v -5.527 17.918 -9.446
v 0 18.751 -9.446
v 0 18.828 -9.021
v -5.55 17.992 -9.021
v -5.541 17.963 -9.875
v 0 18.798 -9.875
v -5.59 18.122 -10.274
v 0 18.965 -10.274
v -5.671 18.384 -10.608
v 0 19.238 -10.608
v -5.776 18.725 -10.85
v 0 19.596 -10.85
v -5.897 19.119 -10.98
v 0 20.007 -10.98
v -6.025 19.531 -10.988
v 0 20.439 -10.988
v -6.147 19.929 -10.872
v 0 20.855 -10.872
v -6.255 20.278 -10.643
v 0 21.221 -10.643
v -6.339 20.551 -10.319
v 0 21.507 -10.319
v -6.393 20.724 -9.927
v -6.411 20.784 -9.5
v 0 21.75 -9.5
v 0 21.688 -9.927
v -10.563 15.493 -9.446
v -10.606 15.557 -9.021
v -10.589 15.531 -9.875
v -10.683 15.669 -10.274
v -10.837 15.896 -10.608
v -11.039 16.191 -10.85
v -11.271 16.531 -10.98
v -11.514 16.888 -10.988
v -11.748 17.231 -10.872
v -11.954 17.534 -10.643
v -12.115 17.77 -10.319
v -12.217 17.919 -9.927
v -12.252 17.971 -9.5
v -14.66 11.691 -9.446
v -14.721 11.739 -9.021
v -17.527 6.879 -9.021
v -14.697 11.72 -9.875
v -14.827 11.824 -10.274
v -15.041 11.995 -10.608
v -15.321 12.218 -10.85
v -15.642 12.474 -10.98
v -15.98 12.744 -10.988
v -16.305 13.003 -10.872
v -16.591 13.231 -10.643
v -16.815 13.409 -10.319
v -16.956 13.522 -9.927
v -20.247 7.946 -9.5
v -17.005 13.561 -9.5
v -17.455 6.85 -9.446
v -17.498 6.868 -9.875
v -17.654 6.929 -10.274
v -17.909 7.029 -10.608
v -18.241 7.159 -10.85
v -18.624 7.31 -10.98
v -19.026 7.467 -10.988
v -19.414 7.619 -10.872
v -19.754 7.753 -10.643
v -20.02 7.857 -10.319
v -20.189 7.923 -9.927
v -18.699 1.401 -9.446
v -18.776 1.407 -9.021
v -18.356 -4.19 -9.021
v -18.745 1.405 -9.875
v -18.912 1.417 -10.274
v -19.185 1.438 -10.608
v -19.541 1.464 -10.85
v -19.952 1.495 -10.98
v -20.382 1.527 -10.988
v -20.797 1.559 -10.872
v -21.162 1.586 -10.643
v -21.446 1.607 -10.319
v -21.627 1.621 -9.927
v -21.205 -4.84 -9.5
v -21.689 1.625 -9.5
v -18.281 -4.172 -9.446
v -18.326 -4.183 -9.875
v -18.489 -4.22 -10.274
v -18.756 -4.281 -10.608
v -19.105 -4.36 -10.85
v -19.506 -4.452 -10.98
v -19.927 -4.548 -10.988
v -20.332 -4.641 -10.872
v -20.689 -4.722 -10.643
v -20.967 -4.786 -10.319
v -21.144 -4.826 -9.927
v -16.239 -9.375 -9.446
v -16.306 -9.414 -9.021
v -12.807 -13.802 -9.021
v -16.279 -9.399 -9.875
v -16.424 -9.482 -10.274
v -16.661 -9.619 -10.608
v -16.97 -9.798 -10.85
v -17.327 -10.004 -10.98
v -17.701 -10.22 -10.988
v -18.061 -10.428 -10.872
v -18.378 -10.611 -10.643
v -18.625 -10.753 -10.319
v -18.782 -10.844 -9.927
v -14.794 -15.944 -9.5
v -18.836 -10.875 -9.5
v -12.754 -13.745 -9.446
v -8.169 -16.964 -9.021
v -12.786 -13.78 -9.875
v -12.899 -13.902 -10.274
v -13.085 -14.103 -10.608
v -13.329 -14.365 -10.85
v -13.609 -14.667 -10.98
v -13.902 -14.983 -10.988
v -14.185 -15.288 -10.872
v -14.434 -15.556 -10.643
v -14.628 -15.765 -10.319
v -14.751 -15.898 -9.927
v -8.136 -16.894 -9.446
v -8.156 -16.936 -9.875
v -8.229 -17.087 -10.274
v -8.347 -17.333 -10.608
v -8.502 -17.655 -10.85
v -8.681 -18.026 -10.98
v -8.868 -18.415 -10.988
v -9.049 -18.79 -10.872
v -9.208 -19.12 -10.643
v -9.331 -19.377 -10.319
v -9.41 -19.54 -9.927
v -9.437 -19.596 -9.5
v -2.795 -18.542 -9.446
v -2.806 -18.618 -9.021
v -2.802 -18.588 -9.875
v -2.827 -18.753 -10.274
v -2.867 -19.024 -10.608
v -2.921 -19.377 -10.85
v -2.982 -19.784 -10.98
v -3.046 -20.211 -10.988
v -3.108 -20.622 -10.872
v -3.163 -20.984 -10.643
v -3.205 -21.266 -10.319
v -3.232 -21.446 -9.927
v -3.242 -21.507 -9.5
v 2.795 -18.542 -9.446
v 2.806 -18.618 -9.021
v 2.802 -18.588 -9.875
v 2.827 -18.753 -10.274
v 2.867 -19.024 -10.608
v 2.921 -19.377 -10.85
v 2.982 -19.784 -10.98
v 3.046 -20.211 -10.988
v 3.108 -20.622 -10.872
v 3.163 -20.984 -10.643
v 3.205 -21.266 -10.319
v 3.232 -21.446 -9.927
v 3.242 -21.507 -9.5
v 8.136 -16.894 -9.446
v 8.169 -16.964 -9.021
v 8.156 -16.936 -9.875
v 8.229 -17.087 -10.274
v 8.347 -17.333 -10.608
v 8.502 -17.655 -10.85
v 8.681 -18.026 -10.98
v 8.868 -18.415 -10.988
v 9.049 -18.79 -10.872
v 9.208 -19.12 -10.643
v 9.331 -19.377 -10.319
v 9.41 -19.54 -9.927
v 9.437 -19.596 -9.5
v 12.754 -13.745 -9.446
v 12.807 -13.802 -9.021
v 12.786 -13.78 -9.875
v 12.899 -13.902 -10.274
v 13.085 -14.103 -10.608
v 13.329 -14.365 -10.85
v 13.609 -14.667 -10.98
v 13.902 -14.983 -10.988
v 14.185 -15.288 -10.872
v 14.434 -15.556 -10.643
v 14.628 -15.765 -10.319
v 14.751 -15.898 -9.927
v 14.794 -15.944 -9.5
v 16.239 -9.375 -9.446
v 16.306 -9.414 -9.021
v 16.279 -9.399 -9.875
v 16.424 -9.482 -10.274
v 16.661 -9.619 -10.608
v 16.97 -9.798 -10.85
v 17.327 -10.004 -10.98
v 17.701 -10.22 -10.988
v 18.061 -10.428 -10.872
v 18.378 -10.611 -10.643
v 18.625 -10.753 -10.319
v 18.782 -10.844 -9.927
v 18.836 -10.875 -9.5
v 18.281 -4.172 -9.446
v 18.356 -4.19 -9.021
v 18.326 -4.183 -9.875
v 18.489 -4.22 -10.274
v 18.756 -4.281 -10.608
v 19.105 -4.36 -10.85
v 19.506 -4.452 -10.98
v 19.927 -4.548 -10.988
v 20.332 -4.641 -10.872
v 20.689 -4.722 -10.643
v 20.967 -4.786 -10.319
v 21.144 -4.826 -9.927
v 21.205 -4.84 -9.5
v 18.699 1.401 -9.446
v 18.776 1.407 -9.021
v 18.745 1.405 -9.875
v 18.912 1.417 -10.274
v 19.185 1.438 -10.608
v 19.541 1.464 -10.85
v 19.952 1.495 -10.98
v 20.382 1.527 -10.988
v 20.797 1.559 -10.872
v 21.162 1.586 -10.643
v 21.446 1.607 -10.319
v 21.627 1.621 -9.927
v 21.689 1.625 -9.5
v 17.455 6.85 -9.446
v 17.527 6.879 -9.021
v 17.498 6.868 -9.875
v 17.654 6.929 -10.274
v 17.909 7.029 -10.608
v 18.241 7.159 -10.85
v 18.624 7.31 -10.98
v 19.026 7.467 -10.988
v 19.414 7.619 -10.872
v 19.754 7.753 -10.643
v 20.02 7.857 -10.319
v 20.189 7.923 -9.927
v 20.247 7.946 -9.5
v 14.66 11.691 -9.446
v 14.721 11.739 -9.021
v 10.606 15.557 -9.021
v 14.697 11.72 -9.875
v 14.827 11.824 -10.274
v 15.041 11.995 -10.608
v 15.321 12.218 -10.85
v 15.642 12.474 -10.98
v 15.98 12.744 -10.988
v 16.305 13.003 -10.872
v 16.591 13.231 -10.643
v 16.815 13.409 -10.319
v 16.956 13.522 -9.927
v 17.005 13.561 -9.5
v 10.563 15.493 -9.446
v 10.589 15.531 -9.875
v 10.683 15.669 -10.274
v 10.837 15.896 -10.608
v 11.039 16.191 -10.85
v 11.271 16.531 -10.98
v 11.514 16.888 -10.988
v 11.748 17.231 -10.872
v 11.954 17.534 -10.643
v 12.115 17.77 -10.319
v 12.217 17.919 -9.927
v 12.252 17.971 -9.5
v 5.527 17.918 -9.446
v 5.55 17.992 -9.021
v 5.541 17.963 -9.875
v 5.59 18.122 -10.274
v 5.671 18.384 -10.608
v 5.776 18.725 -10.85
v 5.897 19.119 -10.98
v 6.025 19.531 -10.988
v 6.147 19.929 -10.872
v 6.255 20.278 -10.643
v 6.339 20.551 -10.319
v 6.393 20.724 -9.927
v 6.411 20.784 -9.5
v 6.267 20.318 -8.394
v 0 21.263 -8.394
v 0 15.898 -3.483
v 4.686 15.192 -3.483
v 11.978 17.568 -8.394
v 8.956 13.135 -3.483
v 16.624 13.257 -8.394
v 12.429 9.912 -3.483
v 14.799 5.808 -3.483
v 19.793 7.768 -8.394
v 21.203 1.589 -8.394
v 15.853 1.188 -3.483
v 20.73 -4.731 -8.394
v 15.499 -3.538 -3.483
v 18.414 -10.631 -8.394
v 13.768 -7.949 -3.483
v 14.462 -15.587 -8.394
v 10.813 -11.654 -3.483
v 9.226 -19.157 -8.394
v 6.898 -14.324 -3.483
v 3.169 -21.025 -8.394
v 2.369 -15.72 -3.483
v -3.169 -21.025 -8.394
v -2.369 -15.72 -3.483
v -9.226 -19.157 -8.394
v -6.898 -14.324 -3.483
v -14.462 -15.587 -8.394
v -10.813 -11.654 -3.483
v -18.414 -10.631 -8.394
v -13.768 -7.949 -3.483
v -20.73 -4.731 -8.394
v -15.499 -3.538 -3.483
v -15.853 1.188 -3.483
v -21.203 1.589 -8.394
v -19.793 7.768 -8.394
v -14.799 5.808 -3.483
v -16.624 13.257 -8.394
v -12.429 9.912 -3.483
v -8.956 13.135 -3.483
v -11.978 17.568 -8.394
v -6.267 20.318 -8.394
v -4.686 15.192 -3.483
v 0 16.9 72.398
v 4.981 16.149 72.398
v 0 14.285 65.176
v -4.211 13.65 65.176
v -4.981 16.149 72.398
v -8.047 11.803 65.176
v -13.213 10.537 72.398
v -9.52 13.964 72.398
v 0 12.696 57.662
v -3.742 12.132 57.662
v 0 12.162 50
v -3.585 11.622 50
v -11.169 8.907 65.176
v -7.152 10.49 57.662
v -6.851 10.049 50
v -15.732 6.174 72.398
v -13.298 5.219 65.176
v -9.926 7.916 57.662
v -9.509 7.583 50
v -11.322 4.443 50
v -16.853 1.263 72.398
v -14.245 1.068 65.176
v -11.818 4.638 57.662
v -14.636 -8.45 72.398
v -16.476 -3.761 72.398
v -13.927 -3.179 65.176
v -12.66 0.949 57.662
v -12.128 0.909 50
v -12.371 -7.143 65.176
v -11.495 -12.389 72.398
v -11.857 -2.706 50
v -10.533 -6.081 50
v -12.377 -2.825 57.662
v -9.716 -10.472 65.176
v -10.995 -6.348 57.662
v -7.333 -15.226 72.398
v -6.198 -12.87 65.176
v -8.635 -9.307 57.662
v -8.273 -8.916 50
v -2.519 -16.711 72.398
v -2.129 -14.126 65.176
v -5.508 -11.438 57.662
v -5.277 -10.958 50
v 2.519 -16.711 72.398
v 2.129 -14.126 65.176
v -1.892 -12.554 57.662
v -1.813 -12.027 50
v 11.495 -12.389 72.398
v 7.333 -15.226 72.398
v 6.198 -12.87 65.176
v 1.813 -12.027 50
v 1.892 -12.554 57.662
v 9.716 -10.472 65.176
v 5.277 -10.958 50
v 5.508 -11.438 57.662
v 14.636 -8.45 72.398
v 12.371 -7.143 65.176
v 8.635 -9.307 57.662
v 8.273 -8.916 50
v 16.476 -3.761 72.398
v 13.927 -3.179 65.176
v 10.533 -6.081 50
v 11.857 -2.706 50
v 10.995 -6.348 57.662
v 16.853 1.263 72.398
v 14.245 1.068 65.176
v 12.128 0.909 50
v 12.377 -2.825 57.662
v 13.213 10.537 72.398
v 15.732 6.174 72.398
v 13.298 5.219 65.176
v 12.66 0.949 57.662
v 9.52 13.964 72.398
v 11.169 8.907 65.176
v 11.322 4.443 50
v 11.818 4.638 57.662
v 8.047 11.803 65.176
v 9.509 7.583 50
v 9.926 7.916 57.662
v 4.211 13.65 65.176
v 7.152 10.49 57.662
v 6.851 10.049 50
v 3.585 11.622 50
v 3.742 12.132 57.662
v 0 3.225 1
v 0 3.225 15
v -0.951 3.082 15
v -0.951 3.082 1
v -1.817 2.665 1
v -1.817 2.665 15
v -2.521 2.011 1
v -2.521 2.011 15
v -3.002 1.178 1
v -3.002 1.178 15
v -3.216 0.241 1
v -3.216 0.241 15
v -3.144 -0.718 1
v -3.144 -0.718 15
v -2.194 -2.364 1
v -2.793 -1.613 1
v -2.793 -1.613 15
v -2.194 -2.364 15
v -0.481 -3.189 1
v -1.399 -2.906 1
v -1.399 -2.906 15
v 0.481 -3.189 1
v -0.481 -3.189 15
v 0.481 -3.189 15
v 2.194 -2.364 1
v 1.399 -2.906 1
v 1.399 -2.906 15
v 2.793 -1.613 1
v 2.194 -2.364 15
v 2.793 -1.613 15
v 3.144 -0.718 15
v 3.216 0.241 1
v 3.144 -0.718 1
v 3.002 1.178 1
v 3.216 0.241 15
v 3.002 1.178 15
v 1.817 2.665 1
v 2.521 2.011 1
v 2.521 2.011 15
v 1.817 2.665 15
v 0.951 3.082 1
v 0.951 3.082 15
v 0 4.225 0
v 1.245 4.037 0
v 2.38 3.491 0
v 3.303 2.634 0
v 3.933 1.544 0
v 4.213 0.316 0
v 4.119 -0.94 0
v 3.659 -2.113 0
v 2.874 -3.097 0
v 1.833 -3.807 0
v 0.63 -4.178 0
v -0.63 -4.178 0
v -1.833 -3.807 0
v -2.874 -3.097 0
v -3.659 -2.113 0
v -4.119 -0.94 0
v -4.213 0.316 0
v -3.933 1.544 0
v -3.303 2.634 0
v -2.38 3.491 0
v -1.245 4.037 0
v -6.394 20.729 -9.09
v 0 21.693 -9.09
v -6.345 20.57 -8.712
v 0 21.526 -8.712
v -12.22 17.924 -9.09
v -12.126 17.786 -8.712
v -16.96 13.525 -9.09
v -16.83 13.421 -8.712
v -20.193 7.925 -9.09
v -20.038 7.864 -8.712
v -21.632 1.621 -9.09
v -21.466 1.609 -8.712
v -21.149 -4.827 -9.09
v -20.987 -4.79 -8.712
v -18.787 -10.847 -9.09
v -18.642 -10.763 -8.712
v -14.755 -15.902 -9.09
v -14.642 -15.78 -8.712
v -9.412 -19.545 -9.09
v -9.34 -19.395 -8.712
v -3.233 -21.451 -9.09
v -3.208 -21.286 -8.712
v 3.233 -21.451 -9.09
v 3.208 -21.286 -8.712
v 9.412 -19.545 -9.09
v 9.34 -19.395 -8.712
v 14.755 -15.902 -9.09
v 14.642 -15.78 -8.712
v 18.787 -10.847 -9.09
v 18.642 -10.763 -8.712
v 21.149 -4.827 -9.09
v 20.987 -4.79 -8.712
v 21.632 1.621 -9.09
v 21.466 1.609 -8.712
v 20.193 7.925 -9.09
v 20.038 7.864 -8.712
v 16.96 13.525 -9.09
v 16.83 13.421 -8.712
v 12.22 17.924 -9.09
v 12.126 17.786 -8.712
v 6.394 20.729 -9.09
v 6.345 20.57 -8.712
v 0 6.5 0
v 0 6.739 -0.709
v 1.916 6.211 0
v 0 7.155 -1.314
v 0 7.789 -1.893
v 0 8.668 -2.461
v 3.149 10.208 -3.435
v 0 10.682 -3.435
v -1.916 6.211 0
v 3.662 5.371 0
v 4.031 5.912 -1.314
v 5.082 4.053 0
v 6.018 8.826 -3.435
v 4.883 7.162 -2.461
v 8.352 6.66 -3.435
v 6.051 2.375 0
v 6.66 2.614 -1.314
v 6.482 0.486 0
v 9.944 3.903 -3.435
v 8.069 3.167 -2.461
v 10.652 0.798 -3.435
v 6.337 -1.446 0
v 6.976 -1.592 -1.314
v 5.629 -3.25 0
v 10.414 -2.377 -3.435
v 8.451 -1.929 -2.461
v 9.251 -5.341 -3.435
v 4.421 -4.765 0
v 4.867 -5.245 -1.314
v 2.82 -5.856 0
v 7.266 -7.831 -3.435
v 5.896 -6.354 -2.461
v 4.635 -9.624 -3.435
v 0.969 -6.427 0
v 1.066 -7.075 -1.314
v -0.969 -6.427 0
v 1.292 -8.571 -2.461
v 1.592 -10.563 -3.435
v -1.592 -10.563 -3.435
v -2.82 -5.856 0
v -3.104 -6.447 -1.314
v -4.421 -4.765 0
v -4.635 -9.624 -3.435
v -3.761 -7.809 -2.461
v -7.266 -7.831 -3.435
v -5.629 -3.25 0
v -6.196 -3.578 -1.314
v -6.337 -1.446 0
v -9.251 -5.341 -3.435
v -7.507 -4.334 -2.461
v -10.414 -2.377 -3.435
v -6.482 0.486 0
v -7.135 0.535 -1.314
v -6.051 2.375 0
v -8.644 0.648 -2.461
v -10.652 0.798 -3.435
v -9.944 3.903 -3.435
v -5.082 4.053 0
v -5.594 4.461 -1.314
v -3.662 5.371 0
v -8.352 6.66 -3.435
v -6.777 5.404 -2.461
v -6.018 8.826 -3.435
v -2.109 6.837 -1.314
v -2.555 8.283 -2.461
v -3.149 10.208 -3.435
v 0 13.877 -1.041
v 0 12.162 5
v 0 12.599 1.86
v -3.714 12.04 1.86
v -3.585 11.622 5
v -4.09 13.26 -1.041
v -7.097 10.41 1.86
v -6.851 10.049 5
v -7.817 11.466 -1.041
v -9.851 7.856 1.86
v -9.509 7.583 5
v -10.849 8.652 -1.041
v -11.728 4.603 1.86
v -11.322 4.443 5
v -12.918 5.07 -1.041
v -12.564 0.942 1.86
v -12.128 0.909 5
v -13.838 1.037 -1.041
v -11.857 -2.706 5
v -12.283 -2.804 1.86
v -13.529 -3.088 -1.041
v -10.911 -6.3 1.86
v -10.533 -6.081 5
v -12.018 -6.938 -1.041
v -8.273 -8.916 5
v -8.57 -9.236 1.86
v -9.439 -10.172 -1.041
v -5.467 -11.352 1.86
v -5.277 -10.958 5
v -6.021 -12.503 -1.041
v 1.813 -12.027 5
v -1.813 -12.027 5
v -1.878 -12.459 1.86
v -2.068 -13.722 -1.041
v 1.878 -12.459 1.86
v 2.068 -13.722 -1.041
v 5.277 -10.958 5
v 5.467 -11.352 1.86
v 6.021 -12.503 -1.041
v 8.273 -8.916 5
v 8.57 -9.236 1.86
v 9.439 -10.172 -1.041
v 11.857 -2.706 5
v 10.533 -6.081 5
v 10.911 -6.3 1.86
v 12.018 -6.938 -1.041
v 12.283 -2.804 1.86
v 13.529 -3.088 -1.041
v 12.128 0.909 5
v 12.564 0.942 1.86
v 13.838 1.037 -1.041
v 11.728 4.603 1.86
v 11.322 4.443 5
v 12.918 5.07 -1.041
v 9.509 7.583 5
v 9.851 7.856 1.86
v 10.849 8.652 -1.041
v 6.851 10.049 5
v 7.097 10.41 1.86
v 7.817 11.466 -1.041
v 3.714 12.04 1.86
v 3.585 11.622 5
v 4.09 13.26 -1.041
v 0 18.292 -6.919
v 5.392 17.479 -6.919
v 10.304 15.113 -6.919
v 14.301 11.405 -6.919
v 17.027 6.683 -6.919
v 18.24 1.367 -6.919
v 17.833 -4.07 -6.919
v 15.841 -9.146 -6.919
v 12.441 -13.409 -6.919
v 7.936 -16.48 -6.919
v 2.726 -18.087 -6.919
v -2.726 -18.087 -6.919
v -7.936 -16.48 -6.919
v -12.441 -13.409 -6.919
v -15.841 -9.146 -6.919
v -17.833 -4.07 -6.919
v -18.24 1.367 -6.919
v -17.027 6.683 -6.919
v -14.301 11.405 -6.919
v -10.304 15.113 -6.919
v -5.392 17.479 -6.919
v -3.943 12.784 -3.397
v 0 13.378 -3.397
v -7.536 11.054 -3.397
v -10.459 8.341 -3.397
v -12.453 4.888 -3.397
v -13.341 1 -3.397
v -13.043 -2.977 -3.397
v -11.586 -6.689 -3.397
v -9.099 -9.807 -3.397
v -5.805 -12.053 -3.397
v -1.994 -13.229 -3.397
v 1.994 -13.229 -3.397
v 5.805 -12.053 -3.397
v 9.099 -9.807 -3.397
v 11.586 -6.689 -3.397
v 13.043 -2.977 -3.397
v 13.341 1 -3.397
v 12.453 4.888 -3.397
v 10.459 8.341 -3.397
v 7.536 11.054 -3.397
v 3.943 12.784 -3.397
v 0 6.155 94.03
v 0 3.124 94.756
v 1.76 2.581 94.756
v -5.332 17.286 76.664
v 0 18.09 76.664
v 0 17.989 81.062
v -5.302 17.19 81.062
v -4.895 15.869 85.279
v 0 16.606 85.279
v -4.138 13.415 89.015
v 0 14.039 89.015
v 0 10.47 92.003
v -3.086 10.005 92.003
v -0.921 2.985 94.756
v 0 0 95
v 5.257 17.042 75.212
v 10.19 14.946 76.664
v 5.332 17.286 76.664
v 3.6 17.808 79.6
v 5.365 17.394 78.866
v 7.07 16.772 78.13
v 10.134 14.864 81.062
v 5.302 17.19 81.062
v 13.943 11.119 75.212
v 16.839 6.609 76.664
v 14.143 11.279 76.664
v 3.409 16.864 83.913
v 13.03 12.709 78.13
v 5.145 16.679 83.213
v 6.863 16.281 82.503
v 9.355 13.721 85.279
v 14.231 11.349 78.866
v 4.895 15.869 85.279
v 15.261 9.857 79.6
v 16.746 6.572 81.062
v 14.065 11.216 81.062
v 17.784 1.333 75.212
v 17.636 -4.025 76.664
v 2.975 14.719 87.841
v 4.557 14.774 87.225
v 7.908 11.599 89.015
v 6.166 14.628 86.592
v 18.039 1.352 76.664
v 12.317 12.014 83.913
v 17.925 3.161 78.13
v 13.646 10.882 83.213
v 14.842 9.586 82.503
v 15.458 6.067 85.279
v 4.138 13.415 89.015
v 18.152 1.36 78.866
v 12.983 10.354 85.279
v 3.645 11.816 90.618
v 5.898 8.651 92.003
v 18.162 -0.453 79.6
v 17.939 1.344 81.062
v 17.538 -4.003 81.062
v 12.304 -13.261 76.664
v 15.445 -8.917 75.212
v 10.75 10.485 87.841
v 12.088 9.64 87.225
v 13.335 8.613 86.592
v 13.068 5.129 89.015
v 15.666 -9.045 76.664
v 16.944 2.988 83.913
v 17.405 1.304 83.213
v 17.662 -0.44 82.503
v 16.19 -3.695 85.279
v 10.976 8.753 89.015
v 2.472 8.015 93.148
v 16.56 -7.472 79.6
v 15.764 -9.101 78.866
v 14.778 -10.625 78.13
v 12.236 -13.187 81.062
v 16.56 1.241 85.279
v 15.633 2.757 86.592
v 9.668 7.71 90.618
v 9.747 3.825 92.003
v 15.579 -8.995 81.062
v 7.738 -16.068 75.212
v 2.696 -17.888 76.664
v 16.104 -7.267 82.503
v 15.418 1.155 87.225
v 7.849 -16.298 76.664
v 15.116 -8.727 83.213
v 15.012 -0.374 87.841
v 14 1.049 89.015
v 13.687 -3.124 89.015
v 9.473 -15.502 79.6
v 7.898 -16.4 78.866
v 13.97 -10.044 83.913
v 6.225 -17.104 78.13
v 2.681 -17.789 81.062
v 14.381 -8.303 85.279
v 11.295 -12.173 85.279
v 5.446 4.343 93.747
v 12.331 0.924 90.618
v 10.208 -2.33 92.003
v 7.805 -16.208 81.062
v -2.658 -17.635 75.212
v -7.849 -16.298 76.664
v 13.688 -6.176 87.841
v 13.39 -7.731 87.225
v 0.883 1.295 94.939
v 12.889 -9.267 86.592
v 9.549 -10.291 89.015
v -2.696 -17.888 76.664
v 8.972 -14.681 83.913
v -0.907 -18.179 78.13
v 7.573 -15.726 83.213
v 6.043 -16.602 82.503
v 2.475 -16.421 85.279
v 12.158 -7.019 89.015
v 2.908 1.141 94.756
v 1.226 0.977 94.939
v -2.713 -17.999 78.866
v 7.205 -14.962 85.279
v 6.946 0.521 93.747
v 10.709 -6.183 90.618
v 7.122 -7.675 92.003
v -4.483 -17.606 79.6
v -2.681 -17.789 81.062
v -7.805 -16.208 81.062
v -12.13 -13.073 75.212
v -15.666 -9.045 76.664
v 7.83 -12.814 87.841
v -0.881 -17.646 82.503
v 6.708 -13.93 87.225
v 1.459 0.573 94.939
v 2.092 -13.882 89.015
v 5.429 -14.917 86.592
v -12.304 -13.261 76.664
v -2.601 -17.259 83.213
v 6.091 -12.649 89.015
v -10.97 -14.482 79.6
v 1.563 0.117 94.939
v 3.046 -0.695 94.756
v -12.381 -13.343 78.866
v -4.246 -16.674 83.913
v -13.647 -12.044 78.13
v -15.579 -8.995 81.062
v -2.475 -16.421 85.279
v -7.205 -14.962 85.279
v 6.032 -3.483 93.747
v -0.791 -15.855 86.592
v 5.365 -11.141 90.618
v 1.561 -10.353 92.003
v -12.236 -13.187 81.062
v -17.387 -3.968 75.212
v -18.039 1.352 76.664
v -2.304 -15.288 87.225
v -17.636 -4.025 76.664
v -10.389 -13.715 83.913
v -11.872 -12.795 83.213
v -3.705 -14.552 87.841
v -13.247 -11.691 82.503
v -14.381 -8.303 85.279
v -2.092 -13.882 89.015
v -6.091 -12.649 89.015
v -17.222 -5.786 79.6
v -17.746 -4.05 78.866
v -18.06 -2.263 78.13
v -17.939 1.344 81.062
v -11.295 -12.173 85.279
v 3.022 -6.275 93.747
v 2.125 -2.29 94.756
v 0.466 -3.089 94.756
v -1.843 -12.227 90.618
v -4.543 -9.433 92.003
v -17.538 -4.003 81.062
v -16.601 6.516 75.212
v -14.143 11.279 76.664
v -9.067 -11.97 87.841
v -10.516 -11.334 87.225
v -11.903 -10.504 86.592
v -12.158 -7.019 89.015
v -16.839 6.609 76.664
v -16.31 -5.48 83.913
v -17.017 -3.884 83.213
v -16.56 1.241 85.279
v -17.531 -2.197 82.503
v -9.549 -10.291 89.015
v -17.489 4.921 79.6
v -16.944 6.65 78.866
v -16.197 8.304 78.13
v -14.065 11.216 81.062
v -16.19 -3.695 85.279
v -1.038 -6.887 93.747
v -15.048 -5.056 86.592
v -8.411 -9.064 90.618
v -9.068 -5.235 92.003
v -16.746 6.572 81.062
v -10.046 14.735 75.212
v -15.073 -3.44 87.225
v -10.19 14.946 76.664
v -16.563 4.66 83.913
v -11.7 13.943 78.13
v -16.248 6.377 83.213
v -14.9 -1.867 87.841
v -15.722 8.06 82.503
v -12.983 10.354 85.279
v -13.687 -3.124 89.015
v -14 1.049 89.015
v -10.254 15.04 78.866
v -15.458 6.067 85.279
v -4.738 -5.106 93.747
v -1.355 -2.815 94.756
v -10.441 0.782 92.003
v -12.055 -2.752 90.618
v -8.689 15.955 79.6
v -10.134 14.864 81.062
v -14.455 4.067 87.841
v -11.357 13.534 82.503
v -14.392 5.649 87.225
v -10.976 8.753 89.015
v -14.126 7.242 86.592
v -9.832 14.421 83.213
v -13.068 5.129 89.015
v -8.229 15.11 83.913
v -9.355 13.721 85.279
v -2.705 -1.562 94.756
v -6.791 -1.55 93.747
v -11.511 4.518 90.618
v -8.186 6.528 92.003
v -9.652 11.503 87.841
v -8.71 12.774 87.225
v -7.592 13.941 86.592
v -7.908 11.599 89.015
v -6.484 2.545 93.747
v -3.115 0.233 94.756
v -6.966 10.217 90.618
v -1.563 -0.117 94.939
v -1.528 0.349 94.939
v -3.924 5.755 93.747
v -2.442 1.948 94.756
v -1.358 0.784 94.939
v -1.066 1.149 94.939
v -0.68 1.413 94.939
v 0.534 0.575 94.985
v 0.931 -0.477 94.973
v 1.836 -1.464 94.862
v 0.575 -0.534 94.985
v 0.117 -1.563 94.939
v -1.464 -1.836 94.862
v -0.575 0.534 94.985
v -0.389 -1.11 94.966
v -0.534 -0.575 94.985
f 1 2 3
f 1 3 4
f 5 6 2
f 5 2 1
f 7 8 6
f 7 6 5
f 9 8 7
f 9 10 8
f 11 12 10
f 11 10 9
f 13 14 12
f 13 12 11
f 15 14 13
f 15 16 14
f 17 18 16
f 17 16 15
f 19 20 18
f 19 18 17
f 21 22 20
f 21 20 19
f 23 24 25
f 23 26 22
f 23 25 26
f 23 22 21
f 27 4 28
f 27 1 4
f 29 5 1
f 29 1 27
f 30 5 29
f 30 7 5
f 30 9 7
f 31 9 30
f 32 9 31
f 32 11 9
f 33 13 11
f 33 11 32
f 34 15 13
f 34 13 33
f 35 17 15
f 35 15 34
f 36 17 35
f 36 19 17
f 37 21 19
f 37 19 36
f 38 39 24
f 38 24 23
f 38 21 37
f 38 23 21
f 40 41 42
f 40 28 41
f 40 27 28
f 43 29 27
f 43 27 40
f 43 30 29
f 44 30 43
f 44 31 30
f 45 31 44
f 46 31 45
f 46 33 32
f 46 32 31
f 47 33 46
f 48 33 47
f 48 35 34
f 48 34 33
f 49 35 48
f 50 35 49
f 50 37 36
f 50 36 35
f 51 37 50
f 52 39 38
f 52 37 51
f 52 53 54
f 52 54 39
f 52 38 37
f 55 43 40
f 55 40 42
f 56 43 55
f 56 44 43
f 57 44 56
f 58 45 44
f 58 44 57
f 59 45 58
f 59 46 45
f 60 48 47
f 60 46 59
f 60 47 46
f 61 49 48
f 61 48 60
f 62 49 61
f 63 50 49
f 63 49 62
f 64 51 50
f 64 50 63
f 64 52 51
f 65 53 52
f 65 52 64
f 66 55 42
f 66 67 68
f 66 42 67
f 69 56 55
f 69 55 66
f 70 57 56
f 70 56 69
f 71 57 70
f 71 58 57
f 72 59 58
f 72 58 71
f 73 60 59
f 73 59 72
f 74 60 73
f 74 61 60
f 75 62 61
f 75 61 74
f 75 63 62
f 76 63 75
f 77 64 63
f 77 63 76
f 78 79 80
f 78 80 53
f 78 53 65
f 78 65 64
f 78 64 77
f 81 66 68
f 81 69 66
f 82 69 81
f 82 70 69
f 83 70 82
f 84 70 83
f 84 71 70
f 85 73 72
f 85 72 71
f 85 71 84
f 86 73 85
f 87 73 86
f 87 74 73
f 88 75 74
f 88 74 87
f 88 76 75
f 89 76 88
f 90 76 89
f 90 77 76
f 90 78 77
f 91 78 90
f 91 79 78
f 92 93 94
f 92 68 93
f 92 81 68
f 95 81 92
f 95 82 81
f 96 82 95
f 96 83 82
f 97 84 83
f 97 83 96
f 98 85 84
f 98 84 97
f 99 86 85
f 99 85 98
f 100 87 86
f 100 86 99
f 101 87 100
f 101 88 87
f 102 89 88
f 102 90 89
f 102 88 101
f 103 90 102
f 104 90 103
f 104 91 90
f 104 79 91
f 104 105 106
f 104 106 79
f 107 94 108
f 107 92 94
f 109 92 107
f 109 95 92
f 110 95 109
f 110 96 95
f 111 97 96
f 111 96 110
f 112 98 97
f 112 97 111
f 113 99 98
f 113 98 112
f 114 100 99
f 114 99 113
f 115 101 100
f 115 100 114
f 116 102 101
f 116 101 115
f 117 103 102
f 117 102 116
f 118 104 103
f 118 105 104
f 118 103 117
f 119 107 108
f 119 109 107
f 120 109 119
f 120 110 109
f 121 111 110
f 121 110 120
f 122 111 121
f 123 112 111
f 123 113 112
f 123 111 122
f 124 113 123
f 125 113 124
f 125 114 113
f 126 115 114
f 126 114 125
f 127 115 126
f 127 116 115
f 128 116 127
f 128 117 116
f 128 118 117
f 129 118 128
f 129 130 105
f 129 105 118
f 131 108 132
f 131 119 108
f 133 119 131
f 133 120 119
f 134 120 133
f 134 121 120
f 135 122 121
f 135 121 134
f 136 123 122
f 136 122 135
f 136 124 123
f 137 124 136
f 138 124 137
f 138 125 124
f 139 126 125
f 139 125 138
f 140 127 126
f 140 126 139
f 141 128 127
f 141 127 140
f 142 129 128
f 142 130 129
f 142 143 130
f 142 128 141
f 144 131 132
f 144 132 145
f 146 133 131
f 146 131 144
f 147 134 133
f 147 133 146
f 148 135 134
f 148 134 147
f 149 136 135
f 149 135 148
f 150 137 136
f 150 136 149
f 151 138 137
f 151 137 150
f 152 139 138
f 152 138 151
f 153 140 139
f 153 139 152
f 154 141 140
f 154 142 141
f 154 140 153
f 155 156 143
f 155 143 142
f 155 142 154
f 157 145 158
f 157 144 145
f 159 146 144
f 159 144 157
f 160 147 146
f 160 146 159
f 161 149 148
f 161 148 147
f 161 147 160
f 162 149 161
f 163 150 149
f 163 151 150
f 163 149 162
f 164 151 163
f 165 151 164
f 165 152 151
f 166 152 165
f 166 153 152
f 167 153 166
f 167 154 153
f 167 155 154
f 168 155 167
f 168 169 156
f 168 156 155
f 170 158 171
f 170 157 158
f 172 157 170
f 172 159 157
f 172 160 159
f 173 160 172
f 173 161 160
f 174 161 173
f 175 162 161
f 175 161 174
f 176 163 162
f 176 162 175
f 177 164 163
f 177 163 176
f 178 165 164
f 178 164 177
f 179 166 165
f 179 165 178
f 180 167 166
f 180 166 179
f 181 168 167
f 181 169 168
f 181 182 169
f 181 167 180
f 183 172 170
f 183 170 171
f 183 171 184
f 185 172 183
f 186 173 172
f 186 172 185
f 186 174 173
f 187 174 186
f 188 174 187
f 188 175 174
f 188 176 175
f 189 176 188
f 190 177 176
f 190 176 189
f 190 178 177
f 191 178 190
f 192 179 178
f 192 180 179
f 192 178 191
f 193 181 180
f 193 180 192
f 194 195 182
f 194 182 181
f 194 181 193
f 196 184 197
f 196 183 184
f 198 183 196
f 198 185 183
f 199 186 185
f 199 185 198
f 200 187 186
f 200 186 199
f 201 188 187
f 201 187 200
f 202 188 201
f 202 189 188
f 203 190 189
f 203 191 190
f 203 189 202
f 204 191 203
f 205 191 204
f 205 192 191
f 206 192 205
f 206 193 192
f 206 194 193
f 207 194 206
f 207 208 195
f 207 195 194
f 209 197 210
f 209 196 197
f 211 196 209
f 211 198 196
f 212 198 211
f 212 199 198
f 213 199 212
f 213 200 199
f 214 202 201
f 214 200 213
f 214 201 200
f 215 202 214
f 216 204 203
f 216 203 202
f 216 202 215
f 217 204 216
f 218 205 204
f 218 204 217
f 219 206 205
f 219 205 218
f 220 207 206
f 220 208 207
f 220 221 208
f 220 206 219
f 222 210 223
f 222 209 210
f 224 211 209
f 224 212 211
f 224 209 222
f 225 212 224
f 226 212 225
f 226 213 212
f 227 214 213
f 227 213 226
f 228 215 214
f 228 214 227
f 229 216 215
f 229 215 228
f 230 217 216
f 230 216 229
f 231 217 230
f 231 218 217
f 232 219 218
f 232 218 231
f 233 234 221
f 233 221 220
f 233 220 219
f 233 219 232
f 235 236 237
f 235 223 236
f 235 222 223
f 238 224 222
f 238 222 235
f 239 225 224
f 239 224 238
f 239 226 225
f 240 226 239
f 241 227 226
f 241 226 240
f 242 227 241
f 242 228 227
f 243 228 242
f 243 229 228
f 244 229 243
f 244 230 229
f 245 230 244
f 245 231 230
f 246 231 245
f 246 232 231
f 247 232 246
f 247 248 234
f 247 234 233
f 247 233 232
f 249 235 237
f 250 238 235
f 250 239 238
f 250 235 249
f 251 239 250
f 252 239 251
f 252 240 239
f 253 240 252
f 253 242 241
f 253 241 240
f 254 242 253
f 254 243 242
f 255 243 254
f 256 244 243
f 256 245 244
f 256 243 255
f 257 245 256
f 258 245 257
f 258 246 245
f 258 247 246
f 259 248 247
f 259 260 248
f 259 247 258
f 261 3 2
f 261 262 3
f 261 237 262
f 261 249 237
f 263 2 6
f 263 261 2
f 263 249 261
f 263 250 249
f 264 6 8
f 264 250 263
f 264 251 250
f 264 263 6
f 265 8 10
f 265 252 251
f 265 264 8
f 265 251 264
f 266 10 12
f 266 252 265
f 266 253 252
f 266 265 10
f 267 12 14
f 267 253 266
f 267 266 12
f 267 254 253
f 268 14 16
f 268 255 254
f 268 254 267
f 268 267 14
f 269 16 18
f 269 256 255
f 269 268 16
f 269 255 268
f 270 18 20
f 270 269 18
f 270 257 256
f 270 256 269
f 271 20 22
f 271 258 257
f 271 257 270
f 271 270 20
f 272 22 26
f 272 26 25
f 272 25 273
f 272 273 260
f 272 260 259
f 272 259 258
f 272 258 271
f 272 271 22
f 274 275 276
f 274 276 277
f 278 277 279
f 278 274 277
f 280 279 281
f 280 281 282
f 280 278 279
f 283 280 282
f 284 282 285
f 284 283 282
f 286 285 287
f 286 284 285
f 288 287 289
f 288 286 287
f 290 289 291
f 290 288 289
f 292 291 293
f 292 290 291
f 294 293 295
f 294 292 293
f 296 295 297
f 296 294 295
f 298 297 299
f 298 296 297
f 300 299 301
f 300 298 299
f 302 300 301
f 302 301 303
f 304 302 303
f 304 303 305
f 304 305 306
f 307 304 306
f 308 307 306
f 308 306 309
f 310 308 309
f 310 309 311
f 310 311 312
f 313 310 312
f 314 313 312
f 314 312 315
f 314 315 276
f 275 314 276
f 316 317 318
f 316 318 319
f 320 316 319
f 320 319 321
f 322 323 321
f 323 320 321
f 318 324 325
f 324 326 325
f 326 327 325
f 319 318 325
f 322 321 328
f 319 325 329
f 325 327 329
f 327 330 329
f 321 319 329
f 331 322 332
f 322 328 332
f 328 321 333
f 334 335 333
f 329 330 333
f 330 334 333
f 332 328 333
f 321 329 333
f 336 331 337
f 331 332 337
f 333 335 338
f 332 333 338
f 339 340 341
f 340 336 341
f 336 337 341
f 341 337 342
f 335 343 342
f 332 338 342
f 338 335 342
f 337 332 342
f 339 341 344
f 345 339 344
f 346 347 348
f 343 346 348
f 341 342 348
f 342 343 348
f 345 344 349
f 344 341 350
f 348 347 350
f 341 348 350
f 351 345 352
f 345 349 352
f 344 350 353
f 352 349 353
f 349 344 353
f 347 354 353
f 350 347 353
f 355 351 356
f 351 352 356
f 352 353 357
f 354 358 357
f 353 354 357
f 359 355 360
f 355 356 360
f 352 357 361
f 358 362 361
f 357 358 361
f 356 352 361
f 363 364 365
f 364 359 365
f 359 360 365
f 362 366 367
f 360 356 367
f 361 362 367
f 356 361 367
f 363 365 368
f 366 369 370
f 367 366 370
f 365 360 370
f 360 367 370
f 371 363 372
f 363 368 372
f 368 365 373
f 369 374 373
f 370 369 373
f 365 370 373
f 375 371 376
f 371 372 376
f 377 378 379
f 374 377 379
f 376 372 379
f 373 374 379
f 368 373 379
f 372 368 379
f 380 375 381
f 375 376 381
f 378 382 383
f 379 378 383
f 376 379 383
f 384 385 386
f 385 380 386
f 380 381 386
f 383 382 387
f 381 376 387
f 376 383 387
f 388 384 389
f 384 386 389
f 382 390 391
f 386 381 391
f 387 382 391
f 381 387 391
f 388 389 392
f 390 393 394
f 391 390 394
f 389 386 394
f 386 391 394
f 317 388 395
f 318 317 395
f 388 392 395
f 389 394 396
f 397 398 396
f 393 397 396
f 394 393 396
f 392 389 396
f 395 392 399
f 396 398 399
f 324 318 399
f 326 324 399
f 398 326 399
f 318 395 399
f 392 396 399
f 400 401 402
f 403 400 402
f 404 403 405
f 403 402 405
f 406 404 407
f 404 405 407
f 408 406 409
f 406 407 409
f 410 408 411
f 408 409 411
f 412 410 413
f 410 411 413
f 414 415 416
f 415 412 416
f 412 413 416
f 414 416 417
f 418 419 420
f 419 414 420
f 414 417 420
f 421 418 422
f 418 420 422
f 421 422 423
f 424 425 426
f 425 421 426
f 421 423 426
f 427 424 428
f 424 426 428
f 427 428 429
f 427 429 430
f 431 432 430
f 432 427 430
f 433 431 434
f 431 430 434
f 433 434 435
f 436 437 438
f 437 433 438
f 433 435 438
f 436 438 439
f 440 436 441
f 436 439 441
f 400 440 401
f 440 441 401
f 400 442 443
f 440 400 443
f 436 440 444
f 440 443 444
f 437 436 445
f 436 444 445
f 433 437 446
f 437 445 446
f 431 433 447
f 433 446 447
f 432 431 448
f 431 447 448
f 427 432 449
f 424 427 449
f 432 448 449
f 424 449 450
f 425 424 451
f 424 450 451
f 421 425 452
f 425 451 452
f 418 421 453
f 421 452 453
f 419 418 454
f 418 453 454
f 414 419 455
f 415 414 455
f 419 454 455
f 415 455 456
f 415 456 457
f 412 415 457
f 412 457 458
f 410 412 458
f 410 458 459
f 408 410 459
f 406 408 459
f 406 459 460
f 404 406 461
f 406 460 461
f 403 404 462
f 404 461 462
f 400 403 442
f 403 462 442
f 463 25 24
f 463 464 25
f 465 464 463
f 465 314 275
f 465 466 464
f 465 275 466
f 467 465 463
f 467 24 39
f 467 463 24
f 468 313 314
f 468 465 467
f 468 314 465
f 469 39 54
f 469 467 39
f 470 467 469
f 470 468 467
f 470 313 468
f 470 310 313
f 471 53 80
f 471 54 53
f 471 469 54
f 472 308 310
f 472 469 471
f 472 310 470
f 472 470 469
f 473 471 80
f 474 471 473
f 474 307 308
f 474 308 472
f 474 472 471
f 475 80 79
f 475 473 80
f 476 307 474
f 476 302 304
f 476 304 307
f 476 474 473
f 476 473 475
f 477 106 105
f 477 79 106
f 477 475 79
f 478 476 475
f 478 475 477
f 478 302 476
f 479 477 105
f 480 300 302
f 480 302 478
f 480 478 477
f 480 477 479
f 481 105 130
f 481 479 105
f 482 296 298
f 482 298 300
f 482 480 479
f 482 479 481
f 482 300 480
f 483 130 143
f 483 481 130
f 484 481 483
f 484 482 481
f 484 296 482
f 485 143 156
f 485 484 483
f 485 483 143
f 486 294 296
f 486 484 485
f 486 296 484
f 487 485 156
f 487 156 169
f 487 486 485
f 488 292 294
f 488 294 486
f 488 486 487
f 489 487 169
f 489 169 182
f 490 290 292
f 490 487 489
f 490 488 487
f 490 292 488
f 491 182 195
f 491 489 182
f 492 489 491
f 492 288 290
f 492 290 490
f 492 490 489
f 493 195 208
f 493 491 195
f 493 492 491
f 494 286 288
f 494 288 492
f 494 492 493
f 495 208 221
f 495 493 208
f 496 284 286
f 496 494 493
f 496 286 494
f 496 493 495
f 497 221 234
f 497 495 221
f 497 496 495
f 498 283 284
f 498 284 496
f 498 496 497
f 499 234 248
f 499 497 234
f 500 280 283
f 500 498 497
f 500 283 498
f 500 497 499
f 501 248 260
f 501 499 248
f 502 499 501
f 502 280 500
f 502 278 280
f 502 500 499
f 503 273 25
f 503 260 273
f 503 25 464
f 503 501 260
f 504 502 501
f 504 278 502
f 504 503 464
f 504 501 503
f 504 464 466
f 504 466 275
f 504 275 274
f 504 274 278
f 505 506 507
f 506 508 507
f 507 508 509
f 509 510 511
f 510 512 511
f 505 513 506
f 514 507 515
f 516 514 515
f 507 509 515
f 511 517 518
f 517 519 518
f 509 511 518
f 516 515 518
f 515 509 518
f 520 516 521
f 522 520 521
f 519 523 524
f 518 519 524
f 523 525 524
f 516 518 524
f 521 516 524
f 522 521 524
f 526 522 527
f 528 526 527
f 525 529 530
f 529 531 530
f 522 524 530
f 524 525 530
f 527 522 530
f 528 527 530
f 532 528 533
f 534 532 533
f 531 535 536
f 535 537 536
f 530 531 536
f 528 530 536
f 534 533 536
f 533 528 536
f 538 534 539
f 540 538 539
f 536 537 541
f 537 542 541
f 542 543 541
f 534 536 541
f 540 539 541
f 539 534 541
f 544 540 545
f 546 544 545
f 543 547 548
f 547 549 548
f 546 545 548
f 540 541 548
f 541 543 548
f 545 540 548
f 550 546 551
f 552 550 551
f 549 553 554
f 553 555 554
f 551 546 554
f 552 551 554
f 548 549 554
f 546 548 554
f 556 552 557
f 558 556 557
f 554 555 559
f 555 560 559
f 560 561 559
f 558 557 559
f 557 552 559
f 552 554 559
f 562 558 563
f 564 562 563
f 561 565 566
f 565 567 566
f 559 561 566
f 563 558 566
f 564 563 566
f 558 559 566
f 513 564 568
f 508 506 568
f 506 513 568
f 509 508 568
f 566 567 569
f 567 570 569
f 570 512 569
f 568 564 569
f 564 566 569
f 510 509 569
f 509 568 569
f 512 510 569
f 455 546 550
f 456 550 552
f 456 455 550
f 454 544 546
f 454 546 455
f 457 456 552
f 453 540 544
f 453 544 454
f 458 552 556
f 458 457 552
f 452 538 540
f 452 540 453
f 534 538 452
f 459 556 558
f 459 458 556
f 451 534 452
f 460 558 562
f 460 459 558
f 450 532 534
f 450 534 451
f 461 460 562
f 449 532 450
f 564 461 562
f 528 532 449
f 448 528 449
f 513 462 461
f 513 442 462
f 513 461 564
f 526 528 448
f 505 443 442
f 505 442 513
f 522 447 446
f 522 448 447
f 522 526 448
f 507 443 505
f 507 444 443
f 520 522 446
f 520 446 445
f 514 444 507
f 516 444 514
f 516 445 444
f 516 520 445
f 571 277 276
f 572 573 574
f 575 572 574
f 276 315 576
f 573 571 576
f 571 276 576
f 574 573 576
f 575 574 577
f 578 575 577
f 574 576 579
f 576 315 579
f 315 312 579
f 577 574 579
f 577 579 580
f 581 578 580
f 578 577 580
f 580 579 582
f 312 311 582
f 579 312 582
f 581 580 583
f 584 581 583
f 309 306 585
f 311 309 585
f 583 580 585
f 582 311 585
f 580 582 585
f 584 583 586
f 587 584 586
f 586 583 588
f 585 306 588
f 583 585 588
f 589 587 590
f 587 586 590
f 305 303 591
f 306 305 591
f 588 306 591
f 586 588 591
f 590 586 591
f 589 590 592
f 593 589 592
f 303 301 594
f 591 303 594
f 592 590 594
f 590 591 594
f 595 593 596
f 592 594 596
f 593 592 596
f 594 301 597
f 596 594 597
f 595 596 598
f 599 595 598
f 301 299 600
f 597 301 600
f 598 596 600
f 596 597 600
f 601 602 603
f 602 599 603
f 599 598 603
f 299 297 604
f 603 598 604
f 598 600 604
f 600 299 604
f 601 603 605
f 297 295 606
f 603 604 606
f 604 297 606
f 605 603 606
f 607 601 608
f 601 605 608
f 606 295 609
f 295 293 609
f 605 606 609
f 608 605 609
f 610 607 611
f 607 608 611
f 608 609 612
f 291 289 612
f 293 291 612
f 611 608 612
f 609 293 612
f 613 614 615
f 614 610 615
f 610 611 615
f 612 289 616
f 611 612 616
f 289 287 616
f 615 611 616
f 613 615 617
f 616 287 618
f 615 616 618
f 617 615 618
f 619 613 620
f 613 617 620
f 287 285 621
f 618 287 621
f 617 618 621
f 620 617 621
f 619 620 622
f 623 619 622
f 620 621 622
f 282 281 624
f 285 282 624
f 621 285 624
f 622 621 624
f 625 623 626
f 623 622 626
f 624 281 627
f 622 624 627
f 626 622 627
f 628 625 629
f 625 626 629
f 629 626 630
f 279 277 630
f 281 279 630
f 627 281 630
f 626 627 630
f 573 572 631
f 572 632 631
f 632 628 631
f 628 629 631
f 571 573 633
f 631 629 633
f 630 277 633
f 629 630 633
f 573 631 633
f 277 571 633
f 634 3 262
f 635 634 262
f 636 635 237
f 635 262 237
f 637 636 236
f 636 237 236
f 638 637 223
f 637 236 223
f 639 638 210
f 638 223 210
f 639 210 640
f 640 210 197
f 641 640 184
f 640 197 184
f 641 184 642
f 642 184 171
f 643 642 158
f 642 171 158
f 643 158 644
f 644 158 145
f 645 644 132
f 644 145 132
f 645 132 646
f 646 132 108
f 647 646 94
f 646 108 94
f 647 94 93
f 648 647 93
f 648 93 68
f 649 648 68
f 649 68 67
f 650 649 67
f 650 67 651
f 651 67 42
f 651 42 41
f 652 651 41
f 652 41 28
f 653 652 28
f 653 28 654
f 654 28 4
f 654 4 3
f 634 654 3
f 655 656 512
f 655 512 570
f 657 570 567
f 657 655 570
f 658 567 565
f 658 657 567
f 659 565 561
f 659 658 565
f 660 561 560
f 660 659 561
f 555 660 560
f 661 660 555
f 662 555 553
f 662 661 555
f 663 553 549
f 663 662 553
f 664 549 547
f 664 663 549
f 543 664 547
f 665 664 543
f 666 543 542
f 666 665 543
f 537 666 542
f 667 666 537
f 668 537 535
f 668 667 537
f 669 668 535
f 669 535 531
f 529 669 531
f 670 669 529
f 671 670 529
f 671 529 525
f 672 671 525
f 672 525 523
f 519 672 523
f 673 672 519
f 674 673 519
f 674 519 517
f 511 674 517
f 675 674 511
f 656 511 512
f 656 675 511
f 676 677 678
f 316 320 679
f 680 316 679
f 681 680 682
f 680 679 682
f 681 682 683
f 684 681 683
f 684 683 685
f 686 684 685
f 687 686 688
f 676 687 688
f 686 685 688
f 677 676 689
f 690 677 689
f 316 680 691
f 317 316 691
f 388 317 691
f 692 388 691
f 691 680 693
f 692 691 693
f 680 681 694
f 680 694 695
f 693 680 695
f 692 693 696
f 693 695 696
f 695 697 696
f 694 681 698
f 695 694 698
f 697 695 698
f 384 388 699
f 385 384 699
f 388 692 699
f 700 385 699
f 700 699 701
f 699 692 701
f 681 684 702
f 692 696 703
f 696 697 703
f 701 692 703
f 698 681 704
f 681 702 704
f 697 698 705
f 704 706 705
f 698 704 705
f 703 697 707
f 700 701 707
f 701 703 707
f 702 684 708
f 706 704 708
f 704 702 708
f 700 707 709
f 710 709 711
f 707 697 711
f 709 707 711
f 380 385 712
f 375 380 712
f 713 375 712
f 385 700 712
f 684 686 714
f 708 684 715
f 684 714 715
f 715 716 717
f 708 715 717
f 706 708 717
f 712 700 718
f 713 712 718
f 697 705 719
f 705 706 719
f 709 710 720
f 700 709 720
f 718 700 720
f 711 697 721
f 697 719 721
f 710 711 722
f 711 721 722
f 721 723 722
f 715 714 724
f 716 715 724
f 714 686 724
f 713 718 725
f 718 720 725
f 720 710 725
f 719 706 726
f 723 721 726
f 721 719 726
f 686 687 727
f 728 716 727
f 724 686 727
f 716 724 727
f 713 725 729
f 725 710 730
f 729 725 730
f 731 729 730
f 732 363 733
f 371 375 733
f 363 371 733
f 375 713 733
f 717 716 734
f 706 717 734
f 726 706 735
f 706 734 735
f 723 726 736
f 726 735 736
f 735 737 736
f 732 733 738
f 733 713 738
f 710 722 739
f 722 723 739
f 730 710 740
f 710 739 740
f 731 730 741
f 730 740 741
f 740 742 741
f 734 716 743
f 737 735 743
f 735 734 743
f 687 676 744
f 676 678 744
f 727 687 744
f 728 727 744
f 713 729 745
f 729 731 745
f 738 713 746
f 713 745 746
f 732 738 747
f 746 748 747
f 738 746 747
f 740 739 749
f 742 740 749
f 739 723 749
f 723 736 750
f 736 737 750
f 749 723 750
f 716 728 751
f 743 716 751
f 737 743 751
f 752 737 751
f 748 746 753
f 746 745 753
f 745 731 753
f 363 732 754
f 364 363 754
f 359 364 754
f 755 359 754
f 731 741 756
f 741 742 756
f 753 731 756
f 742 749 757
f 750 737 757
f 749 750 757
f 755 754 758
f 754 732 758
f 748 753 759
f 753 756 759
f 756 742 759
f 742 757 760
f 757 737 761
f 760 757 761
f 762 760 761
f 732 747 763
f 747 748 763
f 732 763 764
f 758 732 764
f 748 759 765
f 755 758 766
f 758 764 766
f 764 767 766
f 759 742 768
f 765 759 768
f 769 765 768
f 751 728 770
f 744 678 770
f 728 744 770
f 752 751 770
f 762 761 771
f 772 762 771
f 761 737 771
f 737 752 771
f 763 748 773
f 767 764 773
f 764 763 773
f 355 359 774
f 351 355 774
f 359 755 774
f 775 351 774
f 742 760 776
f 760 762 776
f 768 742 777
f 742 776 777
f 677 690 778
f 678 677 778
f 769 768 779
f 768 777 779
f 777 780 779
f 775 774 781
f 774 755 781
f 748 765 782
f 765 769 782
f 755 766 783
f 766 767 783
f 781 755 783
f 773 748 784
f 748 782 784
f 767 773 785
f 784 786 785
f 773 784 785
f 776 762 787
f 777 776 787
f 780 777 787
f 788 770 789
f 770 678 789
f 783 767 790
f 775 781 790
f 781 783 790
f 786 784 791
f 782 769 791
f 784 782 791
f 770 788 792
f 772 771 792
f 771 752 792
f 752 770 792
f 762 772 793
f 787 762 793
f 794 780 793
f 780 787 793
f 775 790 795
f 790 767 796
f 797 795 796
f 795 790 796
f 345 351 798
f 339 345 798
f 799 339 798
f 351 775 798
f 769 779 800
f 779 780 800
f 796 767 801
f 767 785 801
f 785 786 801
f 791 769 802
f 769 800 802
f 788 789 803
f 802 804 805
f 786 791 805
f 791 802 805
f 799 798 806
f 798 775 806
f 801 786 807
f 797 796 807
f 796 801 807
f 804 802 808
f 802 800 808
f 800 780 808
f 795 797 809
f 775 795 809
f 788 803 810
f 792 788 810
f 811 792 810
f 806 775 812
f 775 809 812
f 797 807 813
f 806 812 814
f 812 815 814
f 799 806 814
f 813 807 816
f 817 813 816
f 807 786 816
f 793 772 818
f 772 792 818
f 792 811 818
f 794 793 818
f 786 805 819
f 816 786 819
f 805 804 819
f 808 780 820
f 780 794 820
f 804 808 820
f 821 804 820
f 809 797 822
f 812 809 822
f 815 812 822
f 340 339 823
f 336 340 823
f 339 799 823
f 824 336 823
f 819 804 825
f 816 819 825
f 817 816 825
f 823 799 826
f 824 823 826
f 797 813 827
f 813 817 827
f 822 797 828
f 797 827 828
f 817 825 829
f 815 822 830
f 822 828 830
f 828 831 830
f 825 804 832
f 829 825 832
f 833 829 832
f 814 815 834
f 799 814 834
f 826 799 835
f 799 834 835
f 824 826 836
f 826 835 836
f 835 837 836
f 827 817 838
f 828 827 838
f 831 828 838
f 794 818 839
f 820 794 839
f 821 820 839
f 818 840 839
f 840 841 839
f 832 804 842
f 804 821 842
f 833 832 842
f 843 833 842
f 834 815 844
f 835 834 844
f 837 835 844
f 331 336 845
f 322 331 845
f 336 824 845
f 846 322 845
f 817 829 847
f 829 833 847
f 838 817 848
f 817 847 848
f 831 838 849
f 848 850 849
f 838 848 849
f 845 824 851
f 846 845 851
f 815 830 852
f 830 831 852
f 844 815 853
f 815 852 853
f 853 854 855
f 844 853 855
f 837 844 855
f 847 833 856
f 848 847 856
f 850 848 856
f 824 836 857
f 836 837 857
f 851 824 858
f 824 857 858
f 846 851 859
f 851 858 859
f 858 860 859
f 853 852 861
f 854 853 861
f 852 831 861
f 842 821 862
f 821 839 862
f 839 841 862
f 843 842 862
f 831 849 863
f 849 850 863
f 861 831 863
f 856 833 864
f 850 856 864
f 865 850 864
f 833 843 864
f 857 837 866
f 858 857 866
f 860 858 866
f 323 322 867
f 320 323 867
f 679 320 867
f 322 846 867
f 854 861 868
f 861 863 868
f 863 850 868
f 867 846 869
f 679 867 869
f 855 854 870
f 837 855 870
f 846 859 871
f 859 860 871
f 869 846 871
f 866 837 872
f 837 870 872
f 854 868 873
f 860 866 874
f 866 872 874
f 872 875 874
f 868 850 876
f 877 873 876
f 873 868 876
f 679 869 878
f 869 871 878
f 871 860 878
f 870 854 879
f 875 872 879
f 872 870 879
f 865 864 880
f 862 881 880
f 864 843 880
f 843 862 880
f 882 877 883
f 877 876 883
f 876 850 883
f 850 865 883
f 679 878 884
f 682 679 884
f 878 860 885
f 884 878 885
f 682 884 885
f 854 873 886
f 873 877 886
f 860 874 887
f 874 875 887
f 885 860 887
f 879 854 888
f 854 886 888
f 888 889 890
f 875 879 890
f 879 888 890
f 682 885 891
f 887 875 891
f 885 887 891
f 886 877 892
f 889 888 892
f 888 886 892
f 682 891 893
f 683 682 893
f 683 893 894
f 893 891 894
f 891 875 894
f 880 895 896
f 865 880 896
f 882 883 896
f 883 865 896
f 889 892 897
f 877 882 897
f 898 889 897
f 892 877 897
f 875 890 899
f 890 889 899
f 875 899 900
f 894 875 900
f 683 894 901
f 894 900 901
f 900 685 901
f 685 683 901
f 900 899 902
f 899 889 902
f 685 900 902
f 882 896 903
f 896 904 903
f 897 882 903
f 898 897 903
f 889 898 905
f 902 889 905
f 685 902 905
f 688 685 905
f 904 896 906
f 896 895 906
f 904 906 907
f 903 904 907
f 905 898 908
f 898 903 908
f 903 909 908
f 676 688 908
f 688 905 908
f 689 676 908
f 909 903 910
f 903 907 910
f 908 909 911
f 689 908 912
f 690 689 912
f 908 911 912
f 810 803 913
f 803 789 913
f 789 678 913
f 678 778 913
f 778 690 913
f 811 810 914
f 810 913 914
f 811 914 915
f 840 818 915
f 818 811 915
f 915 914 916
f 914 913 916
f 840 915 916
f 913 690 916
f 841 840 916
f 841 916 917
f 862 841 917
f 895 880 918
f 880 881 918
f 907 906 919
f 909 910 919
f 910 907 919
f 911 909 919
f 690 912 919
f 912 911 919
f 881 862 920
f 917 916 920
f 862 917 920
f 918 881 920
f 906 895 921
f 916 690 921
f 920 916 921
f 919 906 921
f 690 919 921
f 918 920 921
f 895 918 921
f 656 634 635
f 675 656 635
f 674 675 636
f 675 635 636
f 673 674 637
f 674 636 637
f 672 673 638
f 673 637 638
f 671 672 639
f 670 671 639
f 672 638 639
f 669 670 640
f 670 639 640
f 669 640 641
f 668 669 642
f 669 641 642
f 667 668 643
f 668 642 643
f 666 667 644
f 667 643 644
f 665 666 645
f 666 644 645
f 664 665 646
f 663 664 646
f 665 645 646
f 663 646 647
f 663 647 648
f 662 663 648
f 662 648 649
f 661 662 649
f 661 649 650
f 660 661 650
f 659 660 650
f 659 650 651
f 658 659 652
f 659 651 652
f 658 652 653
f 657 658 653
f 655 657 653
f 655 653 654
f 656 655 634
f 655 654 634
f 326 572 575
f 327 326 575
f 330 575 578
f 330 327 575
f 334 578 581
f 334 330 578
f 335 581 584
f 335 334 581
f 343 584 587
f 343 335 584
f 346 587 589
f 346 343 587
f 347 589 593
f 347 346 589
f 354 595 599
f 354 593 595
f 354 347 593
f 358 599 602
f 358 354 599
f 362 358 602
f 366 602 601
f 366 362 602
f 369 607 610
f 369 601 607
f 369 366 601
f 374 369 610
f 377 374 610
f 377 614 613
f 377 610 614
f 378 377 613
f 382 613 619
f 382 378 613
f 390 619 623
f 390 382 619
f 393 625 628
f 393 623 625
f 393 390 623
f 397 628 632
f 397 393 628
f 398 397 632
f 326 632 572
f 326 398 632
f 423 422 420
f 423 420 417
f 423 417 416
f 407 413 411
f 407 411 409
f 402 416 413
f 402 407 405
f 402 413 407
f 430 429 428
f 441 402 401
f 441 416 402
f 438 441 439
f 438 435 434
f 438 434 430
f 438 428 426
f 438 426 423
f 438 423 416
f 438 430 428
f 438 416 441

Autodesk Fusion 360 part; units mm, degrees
sketch "Schizzo1" plane through (0, 0, 0) normal (1, 0, 0) x (0, 1, 0)
  spline S0 degree 4 poles (6.5, 0) (7.1387, -3.4839) (13.3781, -3.3973) (18.2915, -6.9187) (18.8284, -9.0213) knots 0 0 0 0 0 1 1 1 1 1
  line L0 (6.5, 0) -> (7.1387, -3.4839)
  line L1 (7.1387, -3.4839) -> (13.3781, -3.3973)
  line L2 (13.3781, -3.3973) -> (18.2915, -6.9187)
  line L3 (18.2915, -6.9187) -> (18.8284, -9.0213)
  line L4 (3.225, 0) -> (3.225, 15)
  line L5 (15.8979, -3.483) -> (21.2628, -8.3935)
  line L6 (3.225, 0) -> (6.5, 0)
  line L7 (20.25, -9.5) -> (21.75, -9.5) construction
  arc A0 (12.1624, 5) -> (15.8979, -3.483) centre (23.6624, 5) ccw
  line L8 (0, 0) -> (3.225, 0) construction
  line L9 (0, 0) -> (0, 15) construction
  line L10 (3.225, 15) -> (0, 15)
  line L11 (0, 95) -> (0, 15)
  line L12 (20.25, -11) -> (20.25, -9.5) construction
  circle A1 centre (20.25, -9.5) radius 1.5
  line L13 (0, 95) -> (-15, 95) construction
  line L14 (12.1624, 5) -> (12.1624, 50)
  ellipse E0 centre (0, 78.5258) end of major axis (18.2065, 78.5258) minor radius 16.4742 (16.9001, 72.398) -> (0, 95) ccw
  arc A2 (16.9001, 72.398) -> (12.1624, 50) centre (67.476, 50) ccw
  line L15 (0, 81) -> (18, 81) construction
  point P0 (11, 1)
  point P1 (20.25, -11)
  dimension "d1" = 3.225
  dimension "d2" = 15
  dimension "d3" = 6.5
  dimension "d5" = 11
  dimension "d6" = 3
  dimension "d7" = 21.75
  dimension "d8" = 11
  dimension "d9" = 1
  dimension "d17" = 6.24
  dimension "d18" = 3.542
  dimension "d19" = 6.045
  dimension "d20" = 2.17
  dimension "d24" = 11.5
  dimension "d38" = 90
  dimension "d41" = 4
  dimension "d45" = 18
  dimension "d46" = 14
  dimension "d47" = 45
revolve "Rivoluzione1" add sketch "Schizzo1" angle 360 about axis through (0, 0, 95) along (0, 0, -1) contours S0 L1 L2 L3 L4 L5 L6 A0 L10 L11 A1 L14 E0 A2 | A1
chamfer "Smusso1" distance 1 angle 45 1 edges at (-3.0068, 1.1662, 0)
equation "d1 = larghezza_incastro_joystick / 2"
equation "d3 = ( 13 / 2 ) * 1 mm"
equation "d7 = ( 43.5 / 2 ) * 1 mm"
equation "d8 = ( 22 / 2 ) * 1 mm"
equation "altezza_joystick = 90 mm"
equation "larghezza_incastro_joystick = 6.45 mm"
equation "d38 = altezza_joystick"
